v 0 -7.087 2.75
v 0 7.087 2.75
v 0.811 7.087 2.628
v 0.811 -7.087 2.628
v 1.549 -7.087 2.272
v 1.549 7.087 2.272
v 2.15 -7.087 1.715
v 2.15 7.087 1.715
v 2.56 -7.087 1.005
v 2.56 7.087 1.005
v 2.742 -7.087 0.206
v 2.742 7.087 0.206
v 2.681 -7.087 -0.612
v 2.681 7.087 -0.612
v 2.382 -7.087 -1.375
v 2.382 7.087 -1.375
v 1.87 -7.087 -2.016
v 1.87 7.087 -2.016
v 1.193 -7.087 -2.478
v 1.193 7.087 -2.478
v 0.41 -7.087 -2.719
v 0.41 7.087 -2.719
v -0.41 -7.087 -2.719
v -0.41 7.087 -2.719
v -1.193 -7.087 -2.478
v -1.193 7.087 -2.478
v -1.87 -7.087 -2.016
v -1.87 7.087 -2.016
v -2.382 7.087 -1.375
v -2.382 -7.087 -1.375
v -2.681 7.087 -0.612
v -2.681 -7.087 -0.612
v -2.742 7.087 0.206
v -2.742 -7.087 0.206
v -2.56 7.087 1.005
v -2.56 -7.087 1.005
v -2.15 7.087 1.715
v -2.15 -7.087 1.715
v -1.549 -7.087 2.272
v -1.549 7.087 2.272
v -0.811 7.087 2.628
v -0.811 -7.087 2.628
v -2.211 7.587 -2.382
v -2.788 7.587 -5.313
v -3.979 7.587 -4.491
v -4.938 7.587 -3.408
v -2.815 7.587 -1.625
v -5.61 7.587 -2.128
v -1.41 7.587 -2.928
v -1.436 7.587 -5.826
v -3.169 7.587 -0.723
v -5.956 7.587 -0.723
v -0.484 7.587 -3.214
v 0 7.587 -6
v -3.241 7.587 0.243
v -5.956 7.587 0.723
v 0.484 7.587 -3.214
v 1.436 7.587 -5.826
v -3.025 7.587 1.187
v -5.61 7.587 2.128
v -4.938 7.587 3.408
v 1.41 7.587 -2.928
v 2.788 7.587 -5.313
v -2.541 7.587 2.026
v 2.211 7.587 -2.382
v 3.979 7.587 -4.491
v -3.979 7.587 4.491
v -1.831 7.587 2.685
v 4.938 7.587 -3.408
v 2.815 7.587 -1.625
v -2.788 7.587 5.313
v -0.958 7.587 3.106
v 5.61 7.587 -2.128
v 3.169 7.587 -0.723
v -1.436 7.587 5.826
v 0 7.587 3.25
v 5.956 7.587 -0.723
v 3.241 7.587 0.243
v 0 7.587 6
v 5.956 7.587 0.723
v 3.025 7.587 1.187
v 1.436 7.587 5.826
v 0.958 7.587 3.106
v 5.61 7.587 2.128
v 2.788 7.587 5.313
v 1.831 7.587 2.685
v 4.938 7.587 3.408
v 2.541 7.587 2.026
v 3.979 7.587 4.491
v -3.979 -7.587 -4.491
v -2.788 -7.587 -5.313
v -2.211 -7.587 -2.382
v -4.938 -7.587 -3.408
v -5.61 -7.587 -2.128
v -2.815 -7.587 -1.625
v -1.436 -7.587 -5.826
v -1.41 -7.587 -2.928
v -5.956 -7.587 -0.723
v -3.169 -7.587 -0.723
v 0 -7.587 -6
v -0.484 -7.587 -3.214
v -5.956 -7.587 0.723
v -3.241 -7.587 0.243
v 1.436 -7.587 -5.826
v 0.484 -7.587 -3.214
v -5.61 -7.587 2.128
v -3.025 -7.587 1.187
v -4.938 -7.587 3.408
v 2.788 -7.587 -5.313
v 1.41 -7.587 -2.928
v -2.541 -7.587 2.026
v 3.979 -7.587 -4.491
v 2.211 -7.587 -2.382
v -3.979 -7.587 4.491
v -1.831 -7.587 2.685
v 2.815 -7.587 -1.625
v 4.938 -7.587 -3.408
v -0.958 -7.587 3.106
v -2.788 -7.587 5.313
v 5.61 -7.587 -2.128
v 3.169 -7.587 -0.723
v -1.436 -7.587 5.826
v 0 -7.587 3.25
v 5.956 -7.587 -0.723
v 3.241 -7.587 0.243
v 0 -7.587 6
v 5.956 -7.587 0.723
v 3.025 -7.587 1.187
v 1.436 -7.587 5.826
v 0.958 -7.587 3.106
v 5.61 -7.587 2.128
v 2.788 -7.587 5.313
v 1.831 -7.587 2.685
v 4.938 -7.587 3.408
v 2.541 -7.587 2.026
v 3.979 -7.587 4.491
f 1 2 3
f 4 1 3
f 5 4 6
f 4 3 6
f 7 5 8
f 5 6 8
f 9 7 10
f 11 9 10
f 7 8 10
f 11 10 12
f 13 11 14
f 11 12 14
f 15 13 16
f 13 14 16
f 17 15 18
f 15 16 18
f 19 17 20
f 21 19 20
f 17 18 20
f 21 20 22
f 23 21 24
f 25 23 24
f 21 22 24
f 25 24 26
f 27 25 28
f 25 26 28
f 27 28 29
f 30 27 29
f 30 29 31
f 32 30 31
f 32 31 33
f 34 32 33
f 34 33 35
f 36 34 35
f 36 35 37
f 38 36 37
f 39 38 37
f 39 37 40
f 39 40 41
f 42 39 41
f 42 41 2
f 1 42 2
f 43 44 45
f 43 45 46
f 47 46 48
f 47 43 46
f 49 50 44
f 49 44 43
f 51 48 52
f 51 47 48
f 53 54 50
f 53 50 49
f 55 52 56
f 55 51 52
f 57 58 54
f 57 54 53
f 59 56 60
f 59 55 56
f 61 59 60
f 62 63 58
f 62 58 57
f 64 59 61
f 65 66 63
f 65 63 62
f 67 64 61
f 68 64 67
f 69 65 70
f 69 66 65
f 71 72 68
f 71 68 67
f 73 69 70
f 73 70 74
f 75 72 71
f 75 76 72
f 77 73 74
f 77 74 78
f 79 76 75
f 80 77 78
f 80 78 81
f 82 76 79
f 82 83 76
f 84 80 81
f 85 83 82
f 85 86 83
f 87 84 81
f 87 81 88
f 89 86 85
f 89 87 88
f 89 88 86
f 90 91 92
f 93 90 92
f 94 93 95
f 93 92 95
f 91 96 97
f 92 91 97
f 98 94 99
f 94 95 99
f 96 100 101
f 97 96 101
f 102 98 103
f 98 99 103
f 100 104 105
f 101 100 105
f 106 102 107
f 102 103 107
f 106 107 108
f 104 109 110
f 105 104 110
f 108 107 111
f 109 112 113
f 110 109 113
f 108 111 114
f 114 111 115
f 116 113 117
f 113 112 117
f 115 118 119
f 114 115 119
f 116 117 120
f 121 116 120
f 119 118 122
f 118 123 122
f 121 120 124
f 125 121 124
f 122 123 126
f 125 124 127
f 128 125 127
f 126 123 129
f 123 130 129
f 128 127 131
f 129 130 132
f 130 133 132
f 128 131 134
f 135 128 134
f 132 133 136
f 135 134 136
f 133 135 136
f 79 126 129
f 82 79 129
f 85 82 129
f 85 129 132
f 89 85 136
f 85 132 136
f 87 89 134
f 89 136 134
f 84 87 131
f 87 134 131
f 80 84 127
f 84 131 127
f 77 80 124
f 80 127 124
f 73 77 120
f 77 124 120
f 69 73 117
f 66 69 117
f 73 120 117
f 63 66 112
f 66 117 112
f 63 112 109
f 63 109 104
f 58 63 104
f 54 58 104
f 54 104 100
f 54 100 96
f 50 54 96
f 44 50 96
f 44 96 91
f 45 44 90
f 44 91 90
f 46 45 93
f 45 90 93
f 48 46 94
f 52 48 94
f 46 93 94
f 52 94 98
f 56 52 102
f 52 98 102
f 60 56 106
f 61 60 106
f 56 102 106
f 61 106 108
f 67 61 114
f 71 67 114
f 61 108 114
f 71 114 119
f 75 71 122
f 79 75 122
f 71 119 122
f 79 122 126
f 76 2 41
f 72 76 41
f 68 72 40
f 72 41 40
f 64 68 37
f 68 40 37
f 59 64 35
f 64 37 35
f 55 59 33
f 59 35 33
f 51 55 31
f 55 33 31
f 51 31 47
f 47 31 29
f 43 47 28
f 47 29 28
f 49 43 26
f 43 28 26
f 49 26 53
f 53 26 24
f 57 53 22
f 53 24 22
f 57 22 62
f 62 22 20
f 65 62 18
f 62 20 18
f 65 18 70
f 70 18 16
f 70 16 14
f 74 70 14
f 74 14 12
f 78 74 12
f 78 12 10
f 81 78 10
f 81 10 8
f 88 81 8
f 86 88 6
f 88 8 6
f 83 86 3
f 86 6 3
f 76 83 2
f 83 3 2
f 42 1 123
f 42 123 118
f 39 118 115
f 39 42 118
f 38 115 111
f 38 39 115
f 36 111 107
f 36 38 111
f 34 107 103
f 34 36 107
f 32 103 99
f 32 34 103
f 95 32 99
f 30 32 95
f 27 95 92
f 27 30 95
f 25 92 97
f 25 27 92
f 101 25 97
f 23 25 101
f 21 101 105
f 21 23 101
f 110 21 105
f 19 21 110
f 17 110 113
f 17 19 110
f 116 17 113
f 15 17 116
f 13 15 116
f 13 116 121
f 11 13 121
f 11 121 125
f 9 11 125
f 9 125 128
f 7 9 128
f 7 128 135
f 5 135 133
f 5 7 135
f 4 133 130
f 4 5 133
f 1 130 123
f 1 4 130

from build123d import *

# Parameters (mm, degrees)
BOSS_EXTRUDE1_DEPTH      = 7.587499938
BOSS_EXTRUDE1_DEPTH_BACK = 7.587499938
SKETCH1_R                = 6
SKETCH1_R_2              = 2
SKETCH2_R                = 2.749999953
CUT_EXTRUDE1_DEPTH       = 18.386219291


with BuildPart() as part:
    # Sketch1 → Boss-Extrude1 (new, two sides: drawn at the far end of the back side and taken through both)
    with BuildSketch(Plane(origin=(0, 0, 0), x_dir=(1, 0, 0), z_dir=(0, 1, 0)).offset(-BOSS_EXTRUDE1_DEPTH_BACK)):
        with Locations(Location((0, 0, 0), (0, 0, 270))):
            Circle(SKETCH1_R)
        with Locations(Location((0, 0, 0), (0, 0, 270))):
            Circle(SKETCH1_R_2, mode=Mode.SUBTRACT)
    extrude(amount=BOSS_EXTRUDE1_DEPTH + BOSS_EXTRUDE1_DEPTH_BACK)

    # Sketch2 → Cut-Extrude1 (cut, through all)
    with BuildSketch(Plane(origin=(0, 7.587499938, 0), x_dir=(1, 0, 0), z_dir=(0, 1, 0))):
        with Locations(Location((0, 0, 0), (0, 0, 270))):
            Circle(SKETCH2_R)
    extrude(amount=-CUT_EXTRUDE1_DEPTH, mode=Mode.SUBTRACT)

    # Cut-Extrude3 cone 1 section (through the dimple's axis) → Cut-Extrude3 (revolve, cut)
    with BuildSketch(Plane(origin=(0, 7.587499938, 0), x_dir=(0, 0, 1), z_dir=(1, 0, 0))):
        Polygon((0, 0), (3.249999953, 0), (0, 3.249999953), align=None)
    cut_extrude3 = revolve(axis=Axis((0, 7.587499938, 0), (0, -1, 0)), mode=Mode.SUBTRACT)

    # Mirror1: Cut-Extrude3 across plane
    add(cut_extrude3.mirror(Plane.ZX), mode=Mode.SUBTRACT)


solid = part.part
